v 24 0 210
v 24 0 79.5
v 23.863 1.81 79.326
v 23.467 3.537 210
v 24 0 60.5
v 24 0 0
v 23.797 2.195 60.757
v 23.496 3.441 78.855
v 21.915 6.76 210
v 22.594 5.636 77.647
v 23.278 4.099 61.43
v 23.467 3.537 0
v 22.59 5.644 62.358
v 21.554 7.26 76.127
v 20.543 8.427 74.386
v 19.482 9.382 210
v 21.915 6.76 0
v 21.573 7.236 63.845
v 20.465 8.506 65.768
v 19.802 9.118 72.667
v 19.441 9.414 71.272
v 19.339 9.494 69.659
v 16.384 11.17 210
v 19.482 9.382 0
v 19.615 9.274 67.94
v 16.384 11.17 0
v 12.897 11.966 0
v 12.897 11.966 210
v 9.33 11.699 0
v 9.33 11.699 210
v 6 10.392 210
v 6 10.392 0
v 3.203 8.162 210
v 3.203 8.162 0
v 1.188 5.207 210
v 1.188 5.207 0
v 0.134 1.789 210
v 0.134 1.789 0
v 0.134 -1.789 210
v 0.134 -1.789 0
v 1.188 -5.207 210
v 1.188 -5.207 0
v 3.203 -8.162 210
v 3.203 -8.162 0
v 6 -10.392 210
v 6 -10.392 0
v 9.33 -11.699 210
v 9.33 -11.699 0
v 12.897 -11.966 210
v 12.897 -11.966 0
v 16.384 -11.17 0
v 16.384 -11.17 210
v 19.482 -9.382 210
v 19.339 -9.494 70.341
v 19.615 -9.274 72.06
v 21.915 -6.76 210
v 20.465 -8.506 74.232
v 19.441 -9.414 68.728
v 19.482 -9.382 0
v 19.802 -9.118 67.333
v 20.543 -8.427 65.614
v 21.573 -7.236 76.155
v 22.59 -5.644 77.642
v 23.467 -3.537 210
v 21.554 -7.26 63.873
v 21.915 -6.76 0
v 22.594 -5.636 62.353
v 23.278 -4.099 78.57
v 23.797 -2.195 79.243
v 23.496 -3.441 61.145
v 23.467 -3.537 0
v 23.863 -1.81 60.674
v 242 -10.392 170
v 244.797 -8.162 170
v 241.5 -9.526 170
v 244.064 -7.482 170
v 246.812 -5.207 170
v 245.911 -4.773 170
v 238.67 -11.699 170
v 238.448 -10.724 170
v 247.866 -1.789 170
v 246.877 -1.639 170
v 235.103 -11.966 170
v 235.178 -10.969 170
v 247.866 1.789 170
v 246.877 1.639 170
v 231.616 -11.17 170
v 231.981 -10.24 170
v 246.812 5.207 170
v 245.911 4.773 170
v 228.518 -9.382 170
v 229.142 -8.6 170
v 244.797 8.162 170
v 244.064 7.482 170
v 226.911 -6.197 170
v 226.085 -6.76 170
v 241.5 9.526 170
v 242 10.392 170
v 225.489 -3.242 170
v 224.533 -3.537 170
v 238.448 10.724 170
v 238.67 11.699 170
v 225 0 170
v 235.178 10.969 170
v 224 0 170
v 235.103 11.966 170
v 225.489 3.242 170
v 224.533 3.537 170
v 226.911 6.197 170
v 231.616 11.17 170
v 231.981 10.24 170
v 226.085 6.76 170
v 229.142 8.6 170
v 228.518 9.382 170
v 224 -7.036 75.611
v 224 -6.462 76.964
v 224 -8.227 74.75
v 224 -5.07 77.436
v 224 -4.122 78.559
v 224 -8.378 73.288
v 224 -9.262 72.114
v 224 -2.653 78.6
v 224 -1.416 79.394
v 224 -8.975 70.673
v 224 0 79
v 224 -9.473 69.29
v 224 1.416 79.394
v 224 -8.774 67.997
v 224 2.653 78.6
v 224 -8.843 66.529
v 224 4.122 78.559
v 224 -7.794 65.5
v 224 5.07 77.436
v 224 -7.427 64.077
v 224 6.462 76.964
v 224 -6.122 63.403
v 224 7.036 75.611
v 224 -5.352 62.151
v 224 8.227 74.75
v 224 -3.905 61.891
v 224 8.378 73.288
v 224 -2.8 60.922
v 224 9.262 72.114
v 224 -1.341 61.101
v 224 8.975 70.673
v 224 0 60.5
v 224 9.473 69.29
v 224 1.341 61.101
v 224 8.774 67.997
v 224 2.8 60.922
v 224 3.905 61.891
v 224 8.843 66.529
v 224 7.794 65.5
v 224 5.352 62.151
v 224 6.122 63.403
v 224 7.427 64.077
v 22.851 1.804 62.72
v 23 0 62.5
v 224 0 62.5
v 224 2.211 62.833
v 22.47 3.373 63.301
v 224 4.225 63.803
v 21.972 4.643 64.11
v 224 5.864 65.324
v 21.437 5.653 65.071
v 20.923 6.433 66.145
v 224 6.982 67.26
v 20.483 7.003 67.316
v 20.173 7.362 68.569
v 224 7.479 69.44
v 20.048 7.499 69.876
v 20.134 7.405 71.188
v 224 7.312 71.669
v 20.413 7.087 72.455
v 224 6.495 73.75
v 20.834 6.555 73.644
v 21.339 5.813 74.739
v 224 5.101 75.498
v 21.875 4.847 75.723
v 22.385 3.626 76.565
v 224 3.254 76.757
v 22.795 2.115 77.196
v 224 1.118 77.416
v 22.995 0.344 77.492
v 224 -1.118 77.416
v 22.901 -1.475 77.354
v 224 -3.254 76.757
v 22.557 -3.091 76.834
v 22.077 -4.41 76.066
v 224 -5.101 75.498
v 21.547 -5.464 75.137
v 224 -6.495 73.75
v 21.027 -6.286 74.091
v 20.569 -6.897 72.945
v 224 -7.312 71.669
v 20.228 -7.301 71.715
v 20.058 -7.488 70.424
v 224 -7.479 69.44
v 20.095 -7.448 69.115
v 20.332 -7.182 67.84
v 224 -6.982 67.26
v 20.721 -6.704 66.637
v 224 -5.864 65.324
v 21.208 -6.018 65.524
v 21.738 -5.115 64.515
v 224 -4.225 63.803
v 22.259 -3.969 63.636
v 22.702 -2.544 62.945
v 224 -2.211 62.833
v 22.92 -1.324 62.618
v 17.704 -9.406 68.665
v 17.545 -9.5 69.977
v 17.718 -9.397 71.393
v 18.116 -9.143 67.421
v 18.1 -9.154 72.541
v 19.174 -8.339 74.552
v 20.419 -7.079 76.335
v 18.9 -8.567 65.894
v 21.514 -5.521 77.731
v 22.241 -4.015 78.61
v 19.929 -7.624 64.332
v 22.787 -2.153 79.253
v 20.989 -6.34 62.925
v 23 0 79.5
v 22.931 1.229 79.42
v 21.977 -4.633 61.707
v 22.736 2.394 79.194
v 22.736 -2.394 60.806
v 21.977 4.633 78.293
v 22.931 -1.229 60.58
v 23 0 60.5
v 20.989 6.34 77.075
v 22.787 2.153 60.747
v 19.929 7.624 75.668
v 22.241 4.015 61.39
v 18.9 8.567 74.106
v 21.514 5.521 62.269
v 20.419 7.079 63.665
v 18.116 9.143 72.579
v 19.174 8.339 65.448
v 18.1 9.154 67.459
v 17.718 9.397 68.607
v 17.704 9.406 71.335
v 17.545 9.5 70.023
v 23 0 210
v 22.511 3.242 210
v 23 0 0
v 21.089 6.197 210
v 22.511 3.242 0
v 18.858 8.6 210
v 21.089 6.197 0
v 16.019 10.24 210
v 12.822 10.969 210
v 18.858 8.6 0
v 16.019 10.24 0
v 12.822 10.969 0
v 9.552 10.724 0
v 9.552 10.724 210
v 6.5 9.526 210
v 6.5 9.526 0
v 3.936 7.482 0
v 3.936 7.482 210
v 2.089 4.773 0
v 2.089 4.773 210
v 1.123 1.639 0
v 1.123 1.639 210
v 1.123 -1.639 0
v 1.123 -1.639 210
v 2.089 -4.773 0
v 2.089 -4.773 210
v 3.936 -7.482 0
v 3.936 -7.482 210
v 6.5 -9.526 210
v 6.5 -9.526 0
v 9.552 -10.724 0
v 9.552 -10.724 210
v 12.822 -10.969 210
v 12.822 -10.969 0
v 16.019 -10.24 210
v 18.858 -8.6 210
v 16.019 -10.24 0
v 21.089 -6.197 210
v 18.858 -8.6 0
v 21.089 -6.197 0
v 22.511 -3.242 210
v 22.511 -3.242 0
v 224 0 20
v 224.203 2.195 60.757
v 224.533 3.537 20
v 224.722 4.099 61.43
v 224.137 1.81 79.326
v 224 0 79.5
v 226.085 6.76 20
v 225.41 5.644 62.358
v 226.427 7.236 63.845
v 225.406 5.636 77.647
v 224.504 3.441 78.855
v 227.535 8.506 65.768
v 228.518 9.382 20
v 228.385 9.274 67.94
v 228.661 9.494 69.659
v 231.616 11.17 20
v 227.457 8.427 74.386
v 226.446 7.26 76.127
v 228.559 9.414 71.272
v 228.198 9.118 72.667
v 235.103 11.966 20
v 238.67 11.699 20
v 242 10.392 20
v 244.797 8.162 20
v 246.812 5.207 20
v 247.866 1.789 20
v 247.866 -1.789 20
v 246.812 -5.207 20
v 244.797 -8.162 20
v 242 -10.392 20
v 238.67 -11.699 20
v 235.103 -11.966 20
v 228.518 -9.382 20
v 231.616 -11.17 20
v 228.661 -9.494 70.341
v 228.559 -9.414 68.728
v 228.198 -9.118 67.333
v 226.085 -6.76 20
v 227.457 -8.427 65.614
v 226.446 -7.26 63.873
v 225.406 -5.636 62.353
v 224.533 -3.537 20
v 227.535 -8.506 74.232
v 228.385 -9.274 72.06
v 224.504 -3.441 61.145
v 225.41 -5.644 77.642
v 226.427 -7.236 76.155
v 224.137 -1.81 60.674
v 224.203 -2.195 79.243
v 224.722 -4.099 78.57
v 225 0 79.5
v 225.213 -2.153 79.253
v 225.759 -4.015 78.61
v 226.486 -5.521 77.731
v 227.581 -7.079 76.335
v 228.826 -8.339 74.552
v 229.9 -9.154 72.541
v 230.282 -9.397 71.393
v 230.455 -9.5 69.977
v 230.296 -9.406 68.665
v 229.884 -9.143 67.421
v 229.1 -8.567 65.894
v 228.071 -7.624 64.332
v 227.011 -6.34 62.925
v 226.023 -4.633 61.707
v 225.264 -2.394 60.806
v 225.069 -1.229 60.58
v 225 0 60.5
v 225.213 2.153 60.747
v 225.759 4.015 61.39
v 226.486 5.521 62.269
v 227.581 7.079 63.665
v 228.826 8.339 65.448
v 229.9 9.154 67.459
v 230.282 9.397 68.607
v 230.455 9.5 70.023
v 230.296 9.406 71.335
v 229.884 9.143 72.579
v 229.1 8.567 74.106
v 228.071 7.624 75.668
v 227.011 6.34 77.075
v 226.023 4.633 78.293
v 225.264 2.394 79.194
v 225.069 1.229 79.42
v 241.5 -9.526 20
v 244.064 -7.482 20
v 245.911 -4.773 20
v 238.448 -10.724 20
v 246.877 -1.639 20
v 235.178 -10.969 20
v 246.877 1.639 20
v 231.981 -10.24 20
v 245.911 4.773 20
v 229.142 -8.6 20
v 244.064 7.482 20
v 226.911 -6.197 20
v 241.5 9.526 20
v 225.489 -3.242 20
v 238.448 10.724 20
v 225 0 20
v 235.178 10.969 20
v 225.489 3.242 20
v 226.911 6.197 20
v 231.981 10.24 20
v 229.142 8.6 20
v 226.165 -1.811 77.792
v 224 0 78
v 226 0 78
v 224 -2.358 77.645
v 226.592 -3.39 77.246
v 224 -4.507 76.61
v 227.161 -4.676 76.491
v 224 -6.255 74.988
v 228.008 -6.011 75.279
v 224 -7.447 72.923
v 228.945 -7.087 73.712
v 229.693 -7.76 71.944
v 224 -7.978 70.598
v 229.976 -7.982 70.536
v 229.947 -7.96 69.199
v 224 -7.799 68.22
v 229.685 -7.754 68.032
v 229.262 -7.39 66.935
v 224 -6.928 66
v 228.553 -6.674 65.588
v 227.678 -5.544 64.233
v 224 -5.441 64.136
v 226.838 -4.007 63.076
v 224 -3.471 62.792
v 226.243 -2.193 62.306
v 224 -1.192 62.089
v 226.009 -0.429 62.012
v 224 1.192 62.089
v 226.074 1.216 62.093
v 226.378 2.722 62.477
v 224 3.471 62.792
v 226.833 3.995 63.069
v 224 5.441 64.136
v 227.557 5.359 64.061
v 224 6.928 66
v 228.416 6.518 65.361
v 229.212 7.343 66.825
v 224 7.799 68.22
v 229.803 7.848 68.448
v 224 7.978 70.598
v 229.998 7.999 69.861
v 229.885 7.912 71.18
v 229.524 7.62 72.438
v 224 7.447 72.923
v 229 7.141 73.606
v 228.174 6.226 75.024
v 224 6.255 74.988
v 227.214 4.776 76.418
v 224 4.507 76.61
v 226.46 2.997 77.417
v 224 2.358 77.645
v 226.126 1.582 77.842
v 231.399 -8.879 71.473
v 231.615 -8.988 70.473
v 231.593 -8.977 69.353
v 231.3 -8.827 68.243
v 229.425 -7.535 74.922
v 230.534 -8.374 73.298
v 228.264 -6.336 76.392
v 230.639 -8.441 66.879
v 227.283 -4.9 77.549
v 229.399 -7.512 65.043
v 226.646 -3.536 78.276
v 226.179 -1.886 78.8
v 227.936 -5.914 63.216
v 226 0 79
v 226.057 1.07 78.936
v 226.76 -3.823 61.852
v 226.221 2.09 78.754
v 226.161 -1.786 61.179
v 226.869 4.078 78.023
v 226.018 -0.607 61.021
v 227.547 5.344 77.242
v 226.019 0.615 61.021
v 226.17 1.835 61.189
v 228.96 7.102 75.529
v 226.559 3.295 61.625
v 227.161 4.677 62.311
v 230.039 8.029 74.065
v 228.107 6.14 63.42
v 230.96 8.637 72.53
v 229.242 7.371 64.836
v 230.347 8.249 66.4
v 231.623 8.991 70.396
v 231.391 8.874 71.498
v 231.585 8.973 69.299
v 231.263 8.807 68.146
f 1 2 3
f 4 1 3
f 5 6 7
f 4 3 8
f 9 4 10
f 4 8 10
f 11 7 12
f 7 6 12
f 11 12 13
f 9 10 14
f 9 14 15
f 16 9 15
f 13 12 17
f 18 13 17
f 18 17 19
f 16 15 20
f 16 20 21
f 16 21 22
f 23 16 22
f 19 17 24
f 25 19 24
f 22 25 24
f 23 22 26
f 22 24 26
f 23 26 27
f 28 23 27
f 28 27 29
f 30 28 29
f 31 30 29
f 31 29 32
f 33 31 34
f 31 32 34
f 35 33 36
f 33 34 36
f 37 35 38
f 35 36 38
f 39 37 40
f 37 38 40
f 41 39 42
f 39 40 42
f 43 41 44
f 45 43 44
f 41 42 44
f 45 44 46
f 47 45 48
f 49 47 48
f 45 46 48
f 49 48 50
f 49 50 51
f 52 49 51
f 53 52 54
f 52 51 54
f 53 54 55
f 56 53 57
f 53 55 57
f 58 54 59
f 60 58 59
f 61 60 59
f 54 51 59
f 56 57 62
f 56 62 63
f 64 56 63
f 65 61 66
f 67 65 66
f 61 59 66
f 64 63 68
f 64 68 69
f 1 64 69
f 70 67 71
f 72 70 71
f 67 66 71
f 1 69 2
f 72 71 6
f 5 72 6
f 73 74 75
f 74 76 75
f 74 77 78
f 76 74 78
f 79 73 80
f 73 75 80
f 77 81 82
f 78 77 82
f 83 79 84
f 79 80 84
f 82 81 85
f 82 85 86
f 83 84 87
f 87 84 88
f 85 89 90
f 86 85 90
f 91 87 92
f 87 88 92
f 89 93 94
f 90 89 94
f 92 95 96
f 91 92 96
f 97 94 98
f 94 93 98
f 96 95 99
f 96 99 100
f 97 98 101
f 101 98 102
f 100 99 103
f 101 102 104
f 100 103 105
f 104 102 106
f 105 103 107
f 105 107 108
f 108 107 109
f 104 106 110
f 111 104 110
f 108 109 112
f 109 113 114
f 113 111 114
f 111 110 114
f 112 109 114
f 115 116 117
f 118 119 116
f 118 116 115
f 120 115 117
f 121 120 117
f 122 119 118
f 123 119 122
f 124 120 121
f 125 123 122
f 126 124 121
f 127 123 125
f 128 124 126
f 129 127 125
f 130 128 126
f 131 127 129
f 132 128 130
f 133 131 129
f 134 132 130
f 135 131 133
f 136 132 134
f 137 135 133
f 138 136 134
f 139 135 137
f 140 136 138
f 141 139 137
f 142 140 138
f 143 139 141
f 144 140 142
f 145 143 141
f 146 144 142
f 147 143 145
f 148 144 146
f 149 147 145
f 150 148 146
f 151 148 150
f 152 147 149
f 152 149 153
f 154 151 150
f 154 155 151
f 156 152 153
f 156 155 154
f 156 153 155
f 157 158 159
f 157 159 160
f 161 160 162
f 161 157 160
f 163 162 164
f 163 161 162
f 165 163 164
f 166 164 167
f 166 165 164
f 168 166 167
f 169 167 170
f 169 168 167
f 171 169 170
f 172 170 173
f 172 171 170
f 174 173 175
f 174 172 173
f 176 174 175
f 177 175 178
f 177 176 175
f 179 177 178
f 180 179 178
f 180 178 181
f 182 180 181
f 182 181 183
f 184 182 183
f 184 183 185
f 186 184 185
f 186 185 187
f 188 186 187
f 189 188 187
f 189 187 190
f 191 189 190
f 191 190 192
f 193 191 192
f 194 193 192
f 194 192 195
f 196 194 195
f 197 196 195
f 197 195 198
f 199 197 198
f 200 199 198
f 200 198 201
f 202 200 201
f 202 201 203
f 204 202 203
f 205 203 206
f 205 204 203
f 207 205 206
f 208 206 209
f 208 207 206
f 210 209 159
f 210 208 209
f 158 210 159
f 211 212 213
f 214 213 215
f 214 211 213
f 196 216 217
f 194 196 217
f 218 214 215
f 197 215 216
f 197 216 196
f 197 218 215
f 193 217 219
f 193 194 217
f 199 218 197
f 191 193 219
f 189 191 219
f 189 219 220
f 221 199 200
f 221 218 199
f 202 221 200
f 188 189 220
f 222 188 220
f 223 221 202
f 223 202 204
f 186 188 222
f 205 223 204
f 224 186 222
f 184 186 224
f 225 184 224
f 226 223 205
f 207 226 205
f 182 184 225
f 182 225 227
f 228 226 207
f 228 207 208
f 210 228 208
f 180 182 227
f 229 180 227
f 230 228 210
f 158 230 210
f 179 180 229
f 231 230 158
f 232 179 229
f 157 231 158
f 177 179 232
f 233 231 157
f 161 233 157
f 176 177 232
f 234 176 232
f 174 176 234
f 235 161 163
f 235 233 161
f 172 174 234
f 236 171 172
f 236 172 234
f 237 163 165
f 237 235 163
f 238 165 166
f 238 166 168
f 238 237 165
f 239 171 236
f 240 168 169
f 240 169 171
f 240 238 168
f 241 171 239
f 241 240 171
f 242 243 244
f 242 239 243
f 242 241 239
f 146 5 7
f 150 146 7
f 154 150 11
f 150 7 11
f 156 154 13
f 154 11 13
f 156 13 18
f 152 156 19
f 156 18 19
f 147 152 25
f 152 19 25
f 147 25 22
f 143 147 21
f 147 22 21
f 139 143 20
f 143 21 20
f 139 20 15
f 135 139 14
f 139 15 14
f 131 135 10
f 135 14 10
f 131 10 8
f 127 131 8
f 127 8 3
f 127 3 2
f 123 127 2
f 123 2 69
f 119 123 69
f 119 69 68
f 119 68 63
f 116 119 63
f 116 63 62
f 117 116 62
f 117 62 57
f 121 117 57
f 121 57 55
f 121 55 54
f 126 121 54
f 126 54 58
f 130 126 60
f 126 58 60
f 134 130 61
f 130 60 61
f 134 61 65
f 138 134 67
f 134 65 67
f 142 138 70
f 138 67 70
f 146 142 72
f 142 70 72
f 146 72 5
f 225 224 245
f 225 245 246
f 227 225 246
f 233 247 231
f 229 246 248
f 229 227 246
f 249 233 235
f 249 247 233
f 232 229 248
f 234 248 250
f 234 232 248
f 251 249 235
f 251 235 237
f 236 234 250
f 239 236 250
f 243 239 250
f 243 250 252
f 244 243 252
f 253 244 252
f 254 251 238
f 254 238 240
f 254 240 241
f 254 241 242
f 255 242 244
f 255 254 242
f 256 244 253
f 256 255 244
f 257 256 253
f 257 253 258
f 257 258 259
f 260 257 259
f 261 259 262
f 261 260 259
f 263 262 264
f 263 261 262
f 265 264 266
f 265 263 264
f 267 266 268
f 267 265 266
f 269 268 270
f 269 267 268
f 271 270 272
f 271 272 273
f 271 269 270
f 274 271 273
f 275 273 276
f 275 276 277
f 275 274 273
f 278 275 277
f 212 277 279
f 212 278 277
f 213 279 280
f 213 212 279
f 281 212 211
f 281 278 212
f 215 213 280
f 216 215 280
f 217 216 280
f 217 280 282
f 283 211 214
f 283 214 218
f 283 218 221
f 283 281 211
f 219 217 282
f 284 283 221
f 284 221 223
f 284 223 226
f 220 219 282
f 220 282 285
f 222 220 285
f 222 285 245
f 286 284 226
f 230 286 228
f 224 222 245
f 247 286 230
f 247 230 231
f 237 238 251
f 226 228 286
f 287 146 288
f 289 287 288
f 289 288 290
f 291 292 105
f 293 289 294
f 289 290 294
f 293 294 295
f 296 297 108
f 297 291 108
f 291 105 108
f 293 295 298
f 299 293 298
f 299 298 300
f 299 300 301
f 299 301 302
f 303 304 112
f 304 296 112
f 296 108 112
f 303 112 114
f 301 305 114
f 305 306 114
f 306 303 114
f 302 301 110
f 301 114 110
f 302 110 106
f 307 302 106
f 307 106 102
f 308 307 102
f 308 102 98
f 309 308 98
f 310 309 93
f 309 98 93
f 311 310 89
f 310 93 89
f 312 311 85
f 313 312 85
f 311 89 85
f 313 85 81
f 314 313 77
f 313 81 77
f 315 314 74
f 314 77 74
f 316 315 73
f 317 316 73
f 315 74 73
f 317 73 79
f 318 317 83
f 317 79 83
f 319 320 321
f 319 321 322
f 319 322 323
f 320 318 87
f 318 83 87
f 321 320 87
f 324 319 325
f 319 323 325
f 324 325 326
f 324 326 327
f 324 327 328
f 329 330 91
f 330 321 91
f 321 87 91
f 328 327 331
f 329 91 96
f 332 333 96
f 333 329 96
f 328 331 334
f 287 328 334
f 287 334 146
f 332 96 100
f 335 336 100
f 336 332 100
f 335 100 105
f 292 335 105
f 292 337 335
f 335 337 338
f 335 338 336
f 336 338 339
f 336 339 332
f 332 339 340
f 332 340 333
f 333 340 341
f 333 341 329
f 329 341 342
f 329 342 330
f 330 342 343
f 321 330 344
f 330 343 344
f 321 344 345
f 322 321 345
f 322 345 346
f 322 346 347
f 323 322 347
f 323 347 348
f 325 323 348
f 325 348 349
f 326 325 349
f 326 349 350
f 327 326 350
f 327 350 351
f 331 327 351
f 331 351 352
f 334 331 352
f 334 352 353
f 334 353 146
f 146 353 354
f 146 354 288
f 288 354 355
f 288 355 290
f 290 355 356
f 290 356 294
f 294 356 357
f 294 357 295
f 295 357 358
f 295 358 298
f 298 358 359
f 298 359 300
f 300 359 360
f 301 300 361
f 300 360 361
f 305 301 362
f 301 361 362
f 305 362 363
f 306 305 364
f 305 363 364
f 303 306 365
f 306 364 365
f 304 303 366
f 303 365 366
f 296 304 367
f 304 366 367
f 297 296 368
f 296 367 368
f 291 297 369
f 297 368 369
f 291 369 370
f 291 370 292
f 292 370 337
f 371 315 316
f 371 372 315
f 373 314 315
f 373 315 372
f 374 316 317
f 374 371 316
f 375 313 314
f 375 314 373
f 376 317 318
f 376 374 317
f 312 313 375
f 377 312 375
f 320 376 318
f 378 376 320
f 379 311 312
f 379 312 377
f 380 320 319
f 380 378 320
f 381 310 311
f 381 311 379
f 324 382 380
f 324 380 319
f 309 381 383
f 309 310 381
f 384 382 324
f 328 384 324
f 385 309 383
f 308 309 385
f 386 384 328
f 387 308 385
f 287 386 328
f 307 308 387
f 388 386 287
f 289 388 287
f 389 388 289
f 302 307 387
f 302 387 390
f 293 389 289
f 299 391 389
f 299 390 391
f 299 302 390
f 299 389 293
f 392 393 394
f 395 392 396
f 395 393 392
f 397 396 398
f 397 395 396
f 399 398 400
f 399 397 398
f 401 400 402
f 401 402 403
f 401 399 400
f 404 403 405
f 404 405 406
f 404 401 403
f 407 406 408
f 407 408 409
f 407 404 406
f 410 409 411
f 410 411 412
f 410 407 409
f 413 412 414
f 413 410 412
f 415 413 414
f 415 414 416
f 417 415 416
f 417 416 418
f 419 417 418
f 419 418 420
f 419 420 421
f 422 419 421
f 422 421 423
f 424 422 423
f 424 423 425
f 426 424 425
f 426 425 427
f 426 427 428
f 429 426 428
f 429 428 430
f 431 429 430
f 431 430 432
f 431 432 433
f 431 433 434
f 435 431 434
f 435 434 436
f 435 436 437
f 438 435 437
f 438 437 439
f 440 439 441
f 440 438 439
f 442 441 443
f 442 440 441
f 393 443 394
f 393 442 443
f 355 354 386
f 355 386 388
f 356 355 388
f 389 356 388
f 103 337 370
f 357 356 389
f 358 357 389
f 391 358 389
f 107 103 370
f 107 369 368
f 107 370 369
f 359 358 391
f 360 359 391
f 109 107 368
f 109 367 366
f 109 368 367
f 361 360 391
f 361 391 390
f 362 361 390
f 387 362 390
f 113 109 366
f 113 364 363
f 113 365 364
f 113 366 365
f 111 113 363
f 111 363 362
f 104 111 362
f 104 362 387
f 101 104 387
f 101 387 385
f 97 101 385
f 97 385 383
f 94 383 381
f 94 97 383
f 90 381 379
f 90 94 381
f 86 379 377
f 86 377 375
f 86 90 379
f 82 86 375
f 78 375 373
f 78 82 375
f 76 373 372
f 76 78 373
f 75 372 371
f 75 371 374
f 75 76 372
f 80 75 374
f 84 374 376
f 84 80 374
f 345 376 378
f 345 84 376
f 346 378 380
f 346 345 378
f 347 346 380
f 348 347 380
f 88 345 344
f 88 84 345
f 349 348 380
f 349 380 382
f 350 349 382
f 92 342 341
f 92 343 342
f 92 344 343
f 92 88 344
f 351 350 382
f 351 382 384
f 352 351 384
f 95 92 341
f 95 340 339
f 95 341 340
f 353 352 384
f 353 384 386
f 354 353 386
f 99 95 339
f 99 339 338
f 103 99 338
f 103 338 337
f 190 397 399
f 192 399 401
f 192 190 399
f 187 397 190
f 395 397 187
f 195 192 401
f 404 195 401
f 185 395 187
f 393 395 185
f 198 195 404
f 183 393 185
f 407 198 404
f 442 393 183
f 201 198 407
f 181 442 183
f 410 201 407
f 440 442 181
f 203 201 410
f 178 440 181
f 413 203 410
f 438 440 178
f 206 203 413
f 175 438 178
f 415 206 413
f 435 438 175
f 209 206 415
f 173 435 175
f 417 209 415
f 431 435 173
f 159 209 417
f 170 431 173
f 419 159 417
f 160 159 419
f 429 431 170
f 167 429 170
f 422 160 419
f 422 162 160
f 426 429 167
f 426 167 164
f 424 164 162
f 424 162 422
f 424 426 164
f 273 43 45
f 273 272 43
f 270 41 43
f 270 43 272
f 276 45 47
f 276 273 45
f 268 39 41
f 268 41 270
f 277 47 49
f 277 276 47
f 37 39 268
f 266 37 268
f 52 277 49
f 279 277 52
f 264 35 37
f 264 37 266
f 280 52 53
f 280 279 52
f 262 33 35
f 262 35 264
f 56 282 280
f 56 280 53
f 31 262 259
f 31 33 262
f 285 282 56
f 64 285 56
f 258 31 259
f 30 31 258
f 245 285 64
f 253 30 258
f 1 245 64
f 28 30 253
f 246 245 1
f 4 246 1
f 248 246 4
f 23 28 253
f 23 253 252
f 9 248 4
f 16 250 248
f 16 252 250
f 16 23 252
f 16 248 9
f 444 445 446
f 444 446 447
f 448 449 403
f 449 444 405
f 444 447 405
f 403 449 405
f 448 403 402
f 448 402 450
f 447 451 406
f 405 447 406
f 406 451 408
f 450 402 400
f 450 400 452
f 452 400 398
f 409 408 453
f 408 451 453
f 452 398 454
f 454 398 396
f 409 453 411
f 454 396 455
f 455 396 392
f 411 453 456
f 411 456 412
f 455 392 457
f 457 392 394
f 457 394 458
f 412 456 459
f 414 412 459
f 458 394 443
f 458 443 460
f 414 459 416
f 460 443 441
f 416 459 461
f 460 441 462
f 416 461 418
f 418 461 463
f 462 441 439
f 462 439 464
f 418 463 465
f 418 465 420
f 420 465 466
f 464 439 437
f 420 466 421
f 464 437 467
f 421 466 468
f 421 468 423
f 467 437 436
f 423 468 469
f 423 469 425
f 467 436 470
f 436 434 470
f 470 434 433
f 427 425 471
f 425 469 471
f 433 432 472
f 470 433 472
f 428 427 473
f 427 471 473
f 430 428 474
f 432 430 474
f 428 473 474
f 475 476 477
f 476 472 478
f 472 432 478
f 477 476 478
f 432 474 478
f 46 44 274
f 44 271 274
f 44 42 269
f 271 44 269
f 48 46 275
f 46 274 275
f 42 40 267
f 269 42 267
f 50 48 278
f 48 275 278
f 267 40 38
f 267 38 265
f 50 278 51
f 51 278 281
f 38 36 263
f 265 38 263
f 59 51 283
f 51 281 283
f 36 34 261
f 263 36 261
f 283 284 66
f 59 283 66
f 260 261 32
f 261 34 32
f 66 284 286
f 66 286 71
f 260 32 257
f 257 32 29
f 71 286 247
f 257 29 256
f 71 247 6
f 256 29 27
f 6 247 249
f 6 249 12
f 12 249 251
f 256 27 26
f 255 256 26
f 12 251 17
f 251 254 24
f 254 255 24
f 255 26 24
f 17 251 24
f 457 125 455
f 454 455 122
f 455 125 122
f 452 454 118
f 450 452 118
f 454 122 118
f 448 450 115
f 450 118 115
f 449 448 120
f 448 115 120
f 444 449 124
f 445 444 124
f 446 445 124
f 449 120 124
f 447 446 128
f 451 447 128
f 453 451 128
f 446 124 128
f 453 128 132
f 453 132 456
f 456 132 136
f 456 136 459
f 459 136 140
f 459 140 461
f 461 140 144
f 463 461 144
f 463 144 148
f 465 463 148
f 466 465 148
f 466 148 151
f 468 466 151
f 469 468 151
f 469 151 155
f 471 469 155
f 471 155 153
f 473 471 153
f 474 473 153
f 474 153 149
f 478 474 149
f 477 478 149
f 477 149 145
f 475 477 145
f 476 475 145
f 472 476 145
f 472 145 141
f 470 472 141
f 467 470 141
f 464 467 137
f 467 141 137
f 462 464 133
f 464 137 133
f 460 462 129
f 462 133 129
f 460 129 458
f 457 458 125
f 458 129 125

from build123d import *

# Parameters (mm, degrees)
SKETCH_1_R           = 12
SKETCH_1_R_2         = 11
EXTRUDE_1_DEPTH      = 210
SKETCH_2_R           = 9.5
CUT_EXTRUDE_1_DEPTH  = 12
EXTRUDE_2_DEPTH      = 200
EXTRUDE_2_DEPTH_BACK = 11
SKETCH_2_3_R         = 9.5
SKETCH_2_3_R_2       = 7.5
SKETCH_1_2_R         = 11
CUT_EXTRUDE_2_DEPTH  = 250
EXTRUDE_3_DEPTH      = 50
EXTRUDE_3_DEPTH_BACK = 100
SKETCH_5_R           = 12
SKETCH_5_R_2         = 11
CUT_EXTRUDE_START    = 12
SKETCH_6_R           = 9.5
CUT_EXTRUDE_3_DEPTH  = 12
SKETCH_8_R           = 9
SKETCH_8_R_2         = 8
EXTRUDE_4_DEPTH      = 12
SKETCH_9_R           = 10
CUT_EXTRUDE_4_DEPTH  = 97


with BuildPart() as part:
    # 草图1 → 凸台-拉伸1 (new body)
    with BuildSketch(Plane.XY):
        with Locations((12, 0)):
            Circle(SKETCH_1_R)
        with Locations((12, 0)):
            Circle(SKETCH_1_R_2, mode=Mode.SUBTRACT)
    extrude(amount=EXTRUDE_1_DEPTH)

    # 草图2 → 切除-拉伸1 (cut)
    with BuildSketch(Plane(origin=(24, 0, 0), x_dir=(0, 0, -1), z_dir=(1, 0, 0))):
        with Locations((-70, 0)):
            Circle(SKETCH_2_R)
    extrude(amount=-CUT_EXTRUDE_1_DEPTH, mode=Mode.SUBTRACT)

    # 草图2<3> → 凸台-拉伸2 (add, two sides: drawn at the far end of the back side and taken through both)
    with BuildSketch(Plane(origin=(24, 0, 0), x_dir=(0, 0, -1), z_dir=(1, 0, 0)).offset(-EXTRUDE_2_DEPTH_BACK)):
        with Locations((-70, 0)):
            Circle(SKETCH_2_3_R)
        with Locations((-70, 0)):
            Circle(SKETCH_2_3_R_2, mode=Mode.SUBTRACT)
    extrude(amount=EXTRUDE_2_DEPTH + EXTRUDE_2_DEPTH_BACK)

    # 草图1<2> → 切除-拉伸2 (cut)
    with BuildSketch(Plane.XY):
        with Locations((12, 0)):
            Circle(SKETCH_1_2_R)
    extrude(amount=CUT_EXTRUDE_2_DEPTH, mode=Mode.SUBTRACT)

    # 草图8 → 凸台-拉伸4 (add)
    with BuildSketch(Plane(origin=(224, 0, 0), x_dir=(0, 0, -1), z_dir=(1, 0, 0))):
        with Locations((-70, 0)):
            Circle(SKETCH_8_R)
        with Locations((-70, 0)):
            Circle(SKETCH_8_R_2, mode=Mode.SUBTRACT)
    extrude(amount=EXTRUDE_4_DEPTH)

    # 草图9 → 切除-拉伸4 (cut)
    with BuildSketch(Plane(origin=(0, 0, 20), x_dir=(-1, 0, 0), z_dir=(0, 0, -1))):
        with Locations((-236, 0)):
            Circle(SKETCH_9_R)
    extrude(amount=-CUT_EXTRUDE_4_DEPTH, mode=Mode.SUBTRACT)


with BuildPart() as body_2:
    # 草图5 → 凸台-拉伸3 (new, two sides: drawn at the far end of the back side and taken through both)
    with BuildSketch(Plane(origin=(0, 0, 70), x_dir=(-1, 0, 0), z_dir=(0, 0, -1)).offset(-EXTRUDE_3_DEPTH_BACK)):
        with Locations((-236, 0)):
            Circle(SKETCH_5_R)
        with Locations((-236, 0)):
            Circle(SKETCH_5_R_2, mode=Mode.SUBTRACT)
    extrude(amount=EXTRUDE_3_DEPTH + EXTRUDE_3_DEPTH_BACK)

    # 草图6 → 切除-拉伸3 (cut)
    with BuildSketch(Plane(origin=(224, 0, 0), x_dir=(0, 0, -1), z_dir=(1, 0, 0)).offset(CUT_EXTRUDE_START)):
        with Locations((-70, 0)):
            Circle(SKETCH_6_R)
    extrude(amount=-CUT_EXTRUDE_3_DEPTH, mode=Mode.SUBTRACT)


solid = Compound([part.part, body_2.part])
